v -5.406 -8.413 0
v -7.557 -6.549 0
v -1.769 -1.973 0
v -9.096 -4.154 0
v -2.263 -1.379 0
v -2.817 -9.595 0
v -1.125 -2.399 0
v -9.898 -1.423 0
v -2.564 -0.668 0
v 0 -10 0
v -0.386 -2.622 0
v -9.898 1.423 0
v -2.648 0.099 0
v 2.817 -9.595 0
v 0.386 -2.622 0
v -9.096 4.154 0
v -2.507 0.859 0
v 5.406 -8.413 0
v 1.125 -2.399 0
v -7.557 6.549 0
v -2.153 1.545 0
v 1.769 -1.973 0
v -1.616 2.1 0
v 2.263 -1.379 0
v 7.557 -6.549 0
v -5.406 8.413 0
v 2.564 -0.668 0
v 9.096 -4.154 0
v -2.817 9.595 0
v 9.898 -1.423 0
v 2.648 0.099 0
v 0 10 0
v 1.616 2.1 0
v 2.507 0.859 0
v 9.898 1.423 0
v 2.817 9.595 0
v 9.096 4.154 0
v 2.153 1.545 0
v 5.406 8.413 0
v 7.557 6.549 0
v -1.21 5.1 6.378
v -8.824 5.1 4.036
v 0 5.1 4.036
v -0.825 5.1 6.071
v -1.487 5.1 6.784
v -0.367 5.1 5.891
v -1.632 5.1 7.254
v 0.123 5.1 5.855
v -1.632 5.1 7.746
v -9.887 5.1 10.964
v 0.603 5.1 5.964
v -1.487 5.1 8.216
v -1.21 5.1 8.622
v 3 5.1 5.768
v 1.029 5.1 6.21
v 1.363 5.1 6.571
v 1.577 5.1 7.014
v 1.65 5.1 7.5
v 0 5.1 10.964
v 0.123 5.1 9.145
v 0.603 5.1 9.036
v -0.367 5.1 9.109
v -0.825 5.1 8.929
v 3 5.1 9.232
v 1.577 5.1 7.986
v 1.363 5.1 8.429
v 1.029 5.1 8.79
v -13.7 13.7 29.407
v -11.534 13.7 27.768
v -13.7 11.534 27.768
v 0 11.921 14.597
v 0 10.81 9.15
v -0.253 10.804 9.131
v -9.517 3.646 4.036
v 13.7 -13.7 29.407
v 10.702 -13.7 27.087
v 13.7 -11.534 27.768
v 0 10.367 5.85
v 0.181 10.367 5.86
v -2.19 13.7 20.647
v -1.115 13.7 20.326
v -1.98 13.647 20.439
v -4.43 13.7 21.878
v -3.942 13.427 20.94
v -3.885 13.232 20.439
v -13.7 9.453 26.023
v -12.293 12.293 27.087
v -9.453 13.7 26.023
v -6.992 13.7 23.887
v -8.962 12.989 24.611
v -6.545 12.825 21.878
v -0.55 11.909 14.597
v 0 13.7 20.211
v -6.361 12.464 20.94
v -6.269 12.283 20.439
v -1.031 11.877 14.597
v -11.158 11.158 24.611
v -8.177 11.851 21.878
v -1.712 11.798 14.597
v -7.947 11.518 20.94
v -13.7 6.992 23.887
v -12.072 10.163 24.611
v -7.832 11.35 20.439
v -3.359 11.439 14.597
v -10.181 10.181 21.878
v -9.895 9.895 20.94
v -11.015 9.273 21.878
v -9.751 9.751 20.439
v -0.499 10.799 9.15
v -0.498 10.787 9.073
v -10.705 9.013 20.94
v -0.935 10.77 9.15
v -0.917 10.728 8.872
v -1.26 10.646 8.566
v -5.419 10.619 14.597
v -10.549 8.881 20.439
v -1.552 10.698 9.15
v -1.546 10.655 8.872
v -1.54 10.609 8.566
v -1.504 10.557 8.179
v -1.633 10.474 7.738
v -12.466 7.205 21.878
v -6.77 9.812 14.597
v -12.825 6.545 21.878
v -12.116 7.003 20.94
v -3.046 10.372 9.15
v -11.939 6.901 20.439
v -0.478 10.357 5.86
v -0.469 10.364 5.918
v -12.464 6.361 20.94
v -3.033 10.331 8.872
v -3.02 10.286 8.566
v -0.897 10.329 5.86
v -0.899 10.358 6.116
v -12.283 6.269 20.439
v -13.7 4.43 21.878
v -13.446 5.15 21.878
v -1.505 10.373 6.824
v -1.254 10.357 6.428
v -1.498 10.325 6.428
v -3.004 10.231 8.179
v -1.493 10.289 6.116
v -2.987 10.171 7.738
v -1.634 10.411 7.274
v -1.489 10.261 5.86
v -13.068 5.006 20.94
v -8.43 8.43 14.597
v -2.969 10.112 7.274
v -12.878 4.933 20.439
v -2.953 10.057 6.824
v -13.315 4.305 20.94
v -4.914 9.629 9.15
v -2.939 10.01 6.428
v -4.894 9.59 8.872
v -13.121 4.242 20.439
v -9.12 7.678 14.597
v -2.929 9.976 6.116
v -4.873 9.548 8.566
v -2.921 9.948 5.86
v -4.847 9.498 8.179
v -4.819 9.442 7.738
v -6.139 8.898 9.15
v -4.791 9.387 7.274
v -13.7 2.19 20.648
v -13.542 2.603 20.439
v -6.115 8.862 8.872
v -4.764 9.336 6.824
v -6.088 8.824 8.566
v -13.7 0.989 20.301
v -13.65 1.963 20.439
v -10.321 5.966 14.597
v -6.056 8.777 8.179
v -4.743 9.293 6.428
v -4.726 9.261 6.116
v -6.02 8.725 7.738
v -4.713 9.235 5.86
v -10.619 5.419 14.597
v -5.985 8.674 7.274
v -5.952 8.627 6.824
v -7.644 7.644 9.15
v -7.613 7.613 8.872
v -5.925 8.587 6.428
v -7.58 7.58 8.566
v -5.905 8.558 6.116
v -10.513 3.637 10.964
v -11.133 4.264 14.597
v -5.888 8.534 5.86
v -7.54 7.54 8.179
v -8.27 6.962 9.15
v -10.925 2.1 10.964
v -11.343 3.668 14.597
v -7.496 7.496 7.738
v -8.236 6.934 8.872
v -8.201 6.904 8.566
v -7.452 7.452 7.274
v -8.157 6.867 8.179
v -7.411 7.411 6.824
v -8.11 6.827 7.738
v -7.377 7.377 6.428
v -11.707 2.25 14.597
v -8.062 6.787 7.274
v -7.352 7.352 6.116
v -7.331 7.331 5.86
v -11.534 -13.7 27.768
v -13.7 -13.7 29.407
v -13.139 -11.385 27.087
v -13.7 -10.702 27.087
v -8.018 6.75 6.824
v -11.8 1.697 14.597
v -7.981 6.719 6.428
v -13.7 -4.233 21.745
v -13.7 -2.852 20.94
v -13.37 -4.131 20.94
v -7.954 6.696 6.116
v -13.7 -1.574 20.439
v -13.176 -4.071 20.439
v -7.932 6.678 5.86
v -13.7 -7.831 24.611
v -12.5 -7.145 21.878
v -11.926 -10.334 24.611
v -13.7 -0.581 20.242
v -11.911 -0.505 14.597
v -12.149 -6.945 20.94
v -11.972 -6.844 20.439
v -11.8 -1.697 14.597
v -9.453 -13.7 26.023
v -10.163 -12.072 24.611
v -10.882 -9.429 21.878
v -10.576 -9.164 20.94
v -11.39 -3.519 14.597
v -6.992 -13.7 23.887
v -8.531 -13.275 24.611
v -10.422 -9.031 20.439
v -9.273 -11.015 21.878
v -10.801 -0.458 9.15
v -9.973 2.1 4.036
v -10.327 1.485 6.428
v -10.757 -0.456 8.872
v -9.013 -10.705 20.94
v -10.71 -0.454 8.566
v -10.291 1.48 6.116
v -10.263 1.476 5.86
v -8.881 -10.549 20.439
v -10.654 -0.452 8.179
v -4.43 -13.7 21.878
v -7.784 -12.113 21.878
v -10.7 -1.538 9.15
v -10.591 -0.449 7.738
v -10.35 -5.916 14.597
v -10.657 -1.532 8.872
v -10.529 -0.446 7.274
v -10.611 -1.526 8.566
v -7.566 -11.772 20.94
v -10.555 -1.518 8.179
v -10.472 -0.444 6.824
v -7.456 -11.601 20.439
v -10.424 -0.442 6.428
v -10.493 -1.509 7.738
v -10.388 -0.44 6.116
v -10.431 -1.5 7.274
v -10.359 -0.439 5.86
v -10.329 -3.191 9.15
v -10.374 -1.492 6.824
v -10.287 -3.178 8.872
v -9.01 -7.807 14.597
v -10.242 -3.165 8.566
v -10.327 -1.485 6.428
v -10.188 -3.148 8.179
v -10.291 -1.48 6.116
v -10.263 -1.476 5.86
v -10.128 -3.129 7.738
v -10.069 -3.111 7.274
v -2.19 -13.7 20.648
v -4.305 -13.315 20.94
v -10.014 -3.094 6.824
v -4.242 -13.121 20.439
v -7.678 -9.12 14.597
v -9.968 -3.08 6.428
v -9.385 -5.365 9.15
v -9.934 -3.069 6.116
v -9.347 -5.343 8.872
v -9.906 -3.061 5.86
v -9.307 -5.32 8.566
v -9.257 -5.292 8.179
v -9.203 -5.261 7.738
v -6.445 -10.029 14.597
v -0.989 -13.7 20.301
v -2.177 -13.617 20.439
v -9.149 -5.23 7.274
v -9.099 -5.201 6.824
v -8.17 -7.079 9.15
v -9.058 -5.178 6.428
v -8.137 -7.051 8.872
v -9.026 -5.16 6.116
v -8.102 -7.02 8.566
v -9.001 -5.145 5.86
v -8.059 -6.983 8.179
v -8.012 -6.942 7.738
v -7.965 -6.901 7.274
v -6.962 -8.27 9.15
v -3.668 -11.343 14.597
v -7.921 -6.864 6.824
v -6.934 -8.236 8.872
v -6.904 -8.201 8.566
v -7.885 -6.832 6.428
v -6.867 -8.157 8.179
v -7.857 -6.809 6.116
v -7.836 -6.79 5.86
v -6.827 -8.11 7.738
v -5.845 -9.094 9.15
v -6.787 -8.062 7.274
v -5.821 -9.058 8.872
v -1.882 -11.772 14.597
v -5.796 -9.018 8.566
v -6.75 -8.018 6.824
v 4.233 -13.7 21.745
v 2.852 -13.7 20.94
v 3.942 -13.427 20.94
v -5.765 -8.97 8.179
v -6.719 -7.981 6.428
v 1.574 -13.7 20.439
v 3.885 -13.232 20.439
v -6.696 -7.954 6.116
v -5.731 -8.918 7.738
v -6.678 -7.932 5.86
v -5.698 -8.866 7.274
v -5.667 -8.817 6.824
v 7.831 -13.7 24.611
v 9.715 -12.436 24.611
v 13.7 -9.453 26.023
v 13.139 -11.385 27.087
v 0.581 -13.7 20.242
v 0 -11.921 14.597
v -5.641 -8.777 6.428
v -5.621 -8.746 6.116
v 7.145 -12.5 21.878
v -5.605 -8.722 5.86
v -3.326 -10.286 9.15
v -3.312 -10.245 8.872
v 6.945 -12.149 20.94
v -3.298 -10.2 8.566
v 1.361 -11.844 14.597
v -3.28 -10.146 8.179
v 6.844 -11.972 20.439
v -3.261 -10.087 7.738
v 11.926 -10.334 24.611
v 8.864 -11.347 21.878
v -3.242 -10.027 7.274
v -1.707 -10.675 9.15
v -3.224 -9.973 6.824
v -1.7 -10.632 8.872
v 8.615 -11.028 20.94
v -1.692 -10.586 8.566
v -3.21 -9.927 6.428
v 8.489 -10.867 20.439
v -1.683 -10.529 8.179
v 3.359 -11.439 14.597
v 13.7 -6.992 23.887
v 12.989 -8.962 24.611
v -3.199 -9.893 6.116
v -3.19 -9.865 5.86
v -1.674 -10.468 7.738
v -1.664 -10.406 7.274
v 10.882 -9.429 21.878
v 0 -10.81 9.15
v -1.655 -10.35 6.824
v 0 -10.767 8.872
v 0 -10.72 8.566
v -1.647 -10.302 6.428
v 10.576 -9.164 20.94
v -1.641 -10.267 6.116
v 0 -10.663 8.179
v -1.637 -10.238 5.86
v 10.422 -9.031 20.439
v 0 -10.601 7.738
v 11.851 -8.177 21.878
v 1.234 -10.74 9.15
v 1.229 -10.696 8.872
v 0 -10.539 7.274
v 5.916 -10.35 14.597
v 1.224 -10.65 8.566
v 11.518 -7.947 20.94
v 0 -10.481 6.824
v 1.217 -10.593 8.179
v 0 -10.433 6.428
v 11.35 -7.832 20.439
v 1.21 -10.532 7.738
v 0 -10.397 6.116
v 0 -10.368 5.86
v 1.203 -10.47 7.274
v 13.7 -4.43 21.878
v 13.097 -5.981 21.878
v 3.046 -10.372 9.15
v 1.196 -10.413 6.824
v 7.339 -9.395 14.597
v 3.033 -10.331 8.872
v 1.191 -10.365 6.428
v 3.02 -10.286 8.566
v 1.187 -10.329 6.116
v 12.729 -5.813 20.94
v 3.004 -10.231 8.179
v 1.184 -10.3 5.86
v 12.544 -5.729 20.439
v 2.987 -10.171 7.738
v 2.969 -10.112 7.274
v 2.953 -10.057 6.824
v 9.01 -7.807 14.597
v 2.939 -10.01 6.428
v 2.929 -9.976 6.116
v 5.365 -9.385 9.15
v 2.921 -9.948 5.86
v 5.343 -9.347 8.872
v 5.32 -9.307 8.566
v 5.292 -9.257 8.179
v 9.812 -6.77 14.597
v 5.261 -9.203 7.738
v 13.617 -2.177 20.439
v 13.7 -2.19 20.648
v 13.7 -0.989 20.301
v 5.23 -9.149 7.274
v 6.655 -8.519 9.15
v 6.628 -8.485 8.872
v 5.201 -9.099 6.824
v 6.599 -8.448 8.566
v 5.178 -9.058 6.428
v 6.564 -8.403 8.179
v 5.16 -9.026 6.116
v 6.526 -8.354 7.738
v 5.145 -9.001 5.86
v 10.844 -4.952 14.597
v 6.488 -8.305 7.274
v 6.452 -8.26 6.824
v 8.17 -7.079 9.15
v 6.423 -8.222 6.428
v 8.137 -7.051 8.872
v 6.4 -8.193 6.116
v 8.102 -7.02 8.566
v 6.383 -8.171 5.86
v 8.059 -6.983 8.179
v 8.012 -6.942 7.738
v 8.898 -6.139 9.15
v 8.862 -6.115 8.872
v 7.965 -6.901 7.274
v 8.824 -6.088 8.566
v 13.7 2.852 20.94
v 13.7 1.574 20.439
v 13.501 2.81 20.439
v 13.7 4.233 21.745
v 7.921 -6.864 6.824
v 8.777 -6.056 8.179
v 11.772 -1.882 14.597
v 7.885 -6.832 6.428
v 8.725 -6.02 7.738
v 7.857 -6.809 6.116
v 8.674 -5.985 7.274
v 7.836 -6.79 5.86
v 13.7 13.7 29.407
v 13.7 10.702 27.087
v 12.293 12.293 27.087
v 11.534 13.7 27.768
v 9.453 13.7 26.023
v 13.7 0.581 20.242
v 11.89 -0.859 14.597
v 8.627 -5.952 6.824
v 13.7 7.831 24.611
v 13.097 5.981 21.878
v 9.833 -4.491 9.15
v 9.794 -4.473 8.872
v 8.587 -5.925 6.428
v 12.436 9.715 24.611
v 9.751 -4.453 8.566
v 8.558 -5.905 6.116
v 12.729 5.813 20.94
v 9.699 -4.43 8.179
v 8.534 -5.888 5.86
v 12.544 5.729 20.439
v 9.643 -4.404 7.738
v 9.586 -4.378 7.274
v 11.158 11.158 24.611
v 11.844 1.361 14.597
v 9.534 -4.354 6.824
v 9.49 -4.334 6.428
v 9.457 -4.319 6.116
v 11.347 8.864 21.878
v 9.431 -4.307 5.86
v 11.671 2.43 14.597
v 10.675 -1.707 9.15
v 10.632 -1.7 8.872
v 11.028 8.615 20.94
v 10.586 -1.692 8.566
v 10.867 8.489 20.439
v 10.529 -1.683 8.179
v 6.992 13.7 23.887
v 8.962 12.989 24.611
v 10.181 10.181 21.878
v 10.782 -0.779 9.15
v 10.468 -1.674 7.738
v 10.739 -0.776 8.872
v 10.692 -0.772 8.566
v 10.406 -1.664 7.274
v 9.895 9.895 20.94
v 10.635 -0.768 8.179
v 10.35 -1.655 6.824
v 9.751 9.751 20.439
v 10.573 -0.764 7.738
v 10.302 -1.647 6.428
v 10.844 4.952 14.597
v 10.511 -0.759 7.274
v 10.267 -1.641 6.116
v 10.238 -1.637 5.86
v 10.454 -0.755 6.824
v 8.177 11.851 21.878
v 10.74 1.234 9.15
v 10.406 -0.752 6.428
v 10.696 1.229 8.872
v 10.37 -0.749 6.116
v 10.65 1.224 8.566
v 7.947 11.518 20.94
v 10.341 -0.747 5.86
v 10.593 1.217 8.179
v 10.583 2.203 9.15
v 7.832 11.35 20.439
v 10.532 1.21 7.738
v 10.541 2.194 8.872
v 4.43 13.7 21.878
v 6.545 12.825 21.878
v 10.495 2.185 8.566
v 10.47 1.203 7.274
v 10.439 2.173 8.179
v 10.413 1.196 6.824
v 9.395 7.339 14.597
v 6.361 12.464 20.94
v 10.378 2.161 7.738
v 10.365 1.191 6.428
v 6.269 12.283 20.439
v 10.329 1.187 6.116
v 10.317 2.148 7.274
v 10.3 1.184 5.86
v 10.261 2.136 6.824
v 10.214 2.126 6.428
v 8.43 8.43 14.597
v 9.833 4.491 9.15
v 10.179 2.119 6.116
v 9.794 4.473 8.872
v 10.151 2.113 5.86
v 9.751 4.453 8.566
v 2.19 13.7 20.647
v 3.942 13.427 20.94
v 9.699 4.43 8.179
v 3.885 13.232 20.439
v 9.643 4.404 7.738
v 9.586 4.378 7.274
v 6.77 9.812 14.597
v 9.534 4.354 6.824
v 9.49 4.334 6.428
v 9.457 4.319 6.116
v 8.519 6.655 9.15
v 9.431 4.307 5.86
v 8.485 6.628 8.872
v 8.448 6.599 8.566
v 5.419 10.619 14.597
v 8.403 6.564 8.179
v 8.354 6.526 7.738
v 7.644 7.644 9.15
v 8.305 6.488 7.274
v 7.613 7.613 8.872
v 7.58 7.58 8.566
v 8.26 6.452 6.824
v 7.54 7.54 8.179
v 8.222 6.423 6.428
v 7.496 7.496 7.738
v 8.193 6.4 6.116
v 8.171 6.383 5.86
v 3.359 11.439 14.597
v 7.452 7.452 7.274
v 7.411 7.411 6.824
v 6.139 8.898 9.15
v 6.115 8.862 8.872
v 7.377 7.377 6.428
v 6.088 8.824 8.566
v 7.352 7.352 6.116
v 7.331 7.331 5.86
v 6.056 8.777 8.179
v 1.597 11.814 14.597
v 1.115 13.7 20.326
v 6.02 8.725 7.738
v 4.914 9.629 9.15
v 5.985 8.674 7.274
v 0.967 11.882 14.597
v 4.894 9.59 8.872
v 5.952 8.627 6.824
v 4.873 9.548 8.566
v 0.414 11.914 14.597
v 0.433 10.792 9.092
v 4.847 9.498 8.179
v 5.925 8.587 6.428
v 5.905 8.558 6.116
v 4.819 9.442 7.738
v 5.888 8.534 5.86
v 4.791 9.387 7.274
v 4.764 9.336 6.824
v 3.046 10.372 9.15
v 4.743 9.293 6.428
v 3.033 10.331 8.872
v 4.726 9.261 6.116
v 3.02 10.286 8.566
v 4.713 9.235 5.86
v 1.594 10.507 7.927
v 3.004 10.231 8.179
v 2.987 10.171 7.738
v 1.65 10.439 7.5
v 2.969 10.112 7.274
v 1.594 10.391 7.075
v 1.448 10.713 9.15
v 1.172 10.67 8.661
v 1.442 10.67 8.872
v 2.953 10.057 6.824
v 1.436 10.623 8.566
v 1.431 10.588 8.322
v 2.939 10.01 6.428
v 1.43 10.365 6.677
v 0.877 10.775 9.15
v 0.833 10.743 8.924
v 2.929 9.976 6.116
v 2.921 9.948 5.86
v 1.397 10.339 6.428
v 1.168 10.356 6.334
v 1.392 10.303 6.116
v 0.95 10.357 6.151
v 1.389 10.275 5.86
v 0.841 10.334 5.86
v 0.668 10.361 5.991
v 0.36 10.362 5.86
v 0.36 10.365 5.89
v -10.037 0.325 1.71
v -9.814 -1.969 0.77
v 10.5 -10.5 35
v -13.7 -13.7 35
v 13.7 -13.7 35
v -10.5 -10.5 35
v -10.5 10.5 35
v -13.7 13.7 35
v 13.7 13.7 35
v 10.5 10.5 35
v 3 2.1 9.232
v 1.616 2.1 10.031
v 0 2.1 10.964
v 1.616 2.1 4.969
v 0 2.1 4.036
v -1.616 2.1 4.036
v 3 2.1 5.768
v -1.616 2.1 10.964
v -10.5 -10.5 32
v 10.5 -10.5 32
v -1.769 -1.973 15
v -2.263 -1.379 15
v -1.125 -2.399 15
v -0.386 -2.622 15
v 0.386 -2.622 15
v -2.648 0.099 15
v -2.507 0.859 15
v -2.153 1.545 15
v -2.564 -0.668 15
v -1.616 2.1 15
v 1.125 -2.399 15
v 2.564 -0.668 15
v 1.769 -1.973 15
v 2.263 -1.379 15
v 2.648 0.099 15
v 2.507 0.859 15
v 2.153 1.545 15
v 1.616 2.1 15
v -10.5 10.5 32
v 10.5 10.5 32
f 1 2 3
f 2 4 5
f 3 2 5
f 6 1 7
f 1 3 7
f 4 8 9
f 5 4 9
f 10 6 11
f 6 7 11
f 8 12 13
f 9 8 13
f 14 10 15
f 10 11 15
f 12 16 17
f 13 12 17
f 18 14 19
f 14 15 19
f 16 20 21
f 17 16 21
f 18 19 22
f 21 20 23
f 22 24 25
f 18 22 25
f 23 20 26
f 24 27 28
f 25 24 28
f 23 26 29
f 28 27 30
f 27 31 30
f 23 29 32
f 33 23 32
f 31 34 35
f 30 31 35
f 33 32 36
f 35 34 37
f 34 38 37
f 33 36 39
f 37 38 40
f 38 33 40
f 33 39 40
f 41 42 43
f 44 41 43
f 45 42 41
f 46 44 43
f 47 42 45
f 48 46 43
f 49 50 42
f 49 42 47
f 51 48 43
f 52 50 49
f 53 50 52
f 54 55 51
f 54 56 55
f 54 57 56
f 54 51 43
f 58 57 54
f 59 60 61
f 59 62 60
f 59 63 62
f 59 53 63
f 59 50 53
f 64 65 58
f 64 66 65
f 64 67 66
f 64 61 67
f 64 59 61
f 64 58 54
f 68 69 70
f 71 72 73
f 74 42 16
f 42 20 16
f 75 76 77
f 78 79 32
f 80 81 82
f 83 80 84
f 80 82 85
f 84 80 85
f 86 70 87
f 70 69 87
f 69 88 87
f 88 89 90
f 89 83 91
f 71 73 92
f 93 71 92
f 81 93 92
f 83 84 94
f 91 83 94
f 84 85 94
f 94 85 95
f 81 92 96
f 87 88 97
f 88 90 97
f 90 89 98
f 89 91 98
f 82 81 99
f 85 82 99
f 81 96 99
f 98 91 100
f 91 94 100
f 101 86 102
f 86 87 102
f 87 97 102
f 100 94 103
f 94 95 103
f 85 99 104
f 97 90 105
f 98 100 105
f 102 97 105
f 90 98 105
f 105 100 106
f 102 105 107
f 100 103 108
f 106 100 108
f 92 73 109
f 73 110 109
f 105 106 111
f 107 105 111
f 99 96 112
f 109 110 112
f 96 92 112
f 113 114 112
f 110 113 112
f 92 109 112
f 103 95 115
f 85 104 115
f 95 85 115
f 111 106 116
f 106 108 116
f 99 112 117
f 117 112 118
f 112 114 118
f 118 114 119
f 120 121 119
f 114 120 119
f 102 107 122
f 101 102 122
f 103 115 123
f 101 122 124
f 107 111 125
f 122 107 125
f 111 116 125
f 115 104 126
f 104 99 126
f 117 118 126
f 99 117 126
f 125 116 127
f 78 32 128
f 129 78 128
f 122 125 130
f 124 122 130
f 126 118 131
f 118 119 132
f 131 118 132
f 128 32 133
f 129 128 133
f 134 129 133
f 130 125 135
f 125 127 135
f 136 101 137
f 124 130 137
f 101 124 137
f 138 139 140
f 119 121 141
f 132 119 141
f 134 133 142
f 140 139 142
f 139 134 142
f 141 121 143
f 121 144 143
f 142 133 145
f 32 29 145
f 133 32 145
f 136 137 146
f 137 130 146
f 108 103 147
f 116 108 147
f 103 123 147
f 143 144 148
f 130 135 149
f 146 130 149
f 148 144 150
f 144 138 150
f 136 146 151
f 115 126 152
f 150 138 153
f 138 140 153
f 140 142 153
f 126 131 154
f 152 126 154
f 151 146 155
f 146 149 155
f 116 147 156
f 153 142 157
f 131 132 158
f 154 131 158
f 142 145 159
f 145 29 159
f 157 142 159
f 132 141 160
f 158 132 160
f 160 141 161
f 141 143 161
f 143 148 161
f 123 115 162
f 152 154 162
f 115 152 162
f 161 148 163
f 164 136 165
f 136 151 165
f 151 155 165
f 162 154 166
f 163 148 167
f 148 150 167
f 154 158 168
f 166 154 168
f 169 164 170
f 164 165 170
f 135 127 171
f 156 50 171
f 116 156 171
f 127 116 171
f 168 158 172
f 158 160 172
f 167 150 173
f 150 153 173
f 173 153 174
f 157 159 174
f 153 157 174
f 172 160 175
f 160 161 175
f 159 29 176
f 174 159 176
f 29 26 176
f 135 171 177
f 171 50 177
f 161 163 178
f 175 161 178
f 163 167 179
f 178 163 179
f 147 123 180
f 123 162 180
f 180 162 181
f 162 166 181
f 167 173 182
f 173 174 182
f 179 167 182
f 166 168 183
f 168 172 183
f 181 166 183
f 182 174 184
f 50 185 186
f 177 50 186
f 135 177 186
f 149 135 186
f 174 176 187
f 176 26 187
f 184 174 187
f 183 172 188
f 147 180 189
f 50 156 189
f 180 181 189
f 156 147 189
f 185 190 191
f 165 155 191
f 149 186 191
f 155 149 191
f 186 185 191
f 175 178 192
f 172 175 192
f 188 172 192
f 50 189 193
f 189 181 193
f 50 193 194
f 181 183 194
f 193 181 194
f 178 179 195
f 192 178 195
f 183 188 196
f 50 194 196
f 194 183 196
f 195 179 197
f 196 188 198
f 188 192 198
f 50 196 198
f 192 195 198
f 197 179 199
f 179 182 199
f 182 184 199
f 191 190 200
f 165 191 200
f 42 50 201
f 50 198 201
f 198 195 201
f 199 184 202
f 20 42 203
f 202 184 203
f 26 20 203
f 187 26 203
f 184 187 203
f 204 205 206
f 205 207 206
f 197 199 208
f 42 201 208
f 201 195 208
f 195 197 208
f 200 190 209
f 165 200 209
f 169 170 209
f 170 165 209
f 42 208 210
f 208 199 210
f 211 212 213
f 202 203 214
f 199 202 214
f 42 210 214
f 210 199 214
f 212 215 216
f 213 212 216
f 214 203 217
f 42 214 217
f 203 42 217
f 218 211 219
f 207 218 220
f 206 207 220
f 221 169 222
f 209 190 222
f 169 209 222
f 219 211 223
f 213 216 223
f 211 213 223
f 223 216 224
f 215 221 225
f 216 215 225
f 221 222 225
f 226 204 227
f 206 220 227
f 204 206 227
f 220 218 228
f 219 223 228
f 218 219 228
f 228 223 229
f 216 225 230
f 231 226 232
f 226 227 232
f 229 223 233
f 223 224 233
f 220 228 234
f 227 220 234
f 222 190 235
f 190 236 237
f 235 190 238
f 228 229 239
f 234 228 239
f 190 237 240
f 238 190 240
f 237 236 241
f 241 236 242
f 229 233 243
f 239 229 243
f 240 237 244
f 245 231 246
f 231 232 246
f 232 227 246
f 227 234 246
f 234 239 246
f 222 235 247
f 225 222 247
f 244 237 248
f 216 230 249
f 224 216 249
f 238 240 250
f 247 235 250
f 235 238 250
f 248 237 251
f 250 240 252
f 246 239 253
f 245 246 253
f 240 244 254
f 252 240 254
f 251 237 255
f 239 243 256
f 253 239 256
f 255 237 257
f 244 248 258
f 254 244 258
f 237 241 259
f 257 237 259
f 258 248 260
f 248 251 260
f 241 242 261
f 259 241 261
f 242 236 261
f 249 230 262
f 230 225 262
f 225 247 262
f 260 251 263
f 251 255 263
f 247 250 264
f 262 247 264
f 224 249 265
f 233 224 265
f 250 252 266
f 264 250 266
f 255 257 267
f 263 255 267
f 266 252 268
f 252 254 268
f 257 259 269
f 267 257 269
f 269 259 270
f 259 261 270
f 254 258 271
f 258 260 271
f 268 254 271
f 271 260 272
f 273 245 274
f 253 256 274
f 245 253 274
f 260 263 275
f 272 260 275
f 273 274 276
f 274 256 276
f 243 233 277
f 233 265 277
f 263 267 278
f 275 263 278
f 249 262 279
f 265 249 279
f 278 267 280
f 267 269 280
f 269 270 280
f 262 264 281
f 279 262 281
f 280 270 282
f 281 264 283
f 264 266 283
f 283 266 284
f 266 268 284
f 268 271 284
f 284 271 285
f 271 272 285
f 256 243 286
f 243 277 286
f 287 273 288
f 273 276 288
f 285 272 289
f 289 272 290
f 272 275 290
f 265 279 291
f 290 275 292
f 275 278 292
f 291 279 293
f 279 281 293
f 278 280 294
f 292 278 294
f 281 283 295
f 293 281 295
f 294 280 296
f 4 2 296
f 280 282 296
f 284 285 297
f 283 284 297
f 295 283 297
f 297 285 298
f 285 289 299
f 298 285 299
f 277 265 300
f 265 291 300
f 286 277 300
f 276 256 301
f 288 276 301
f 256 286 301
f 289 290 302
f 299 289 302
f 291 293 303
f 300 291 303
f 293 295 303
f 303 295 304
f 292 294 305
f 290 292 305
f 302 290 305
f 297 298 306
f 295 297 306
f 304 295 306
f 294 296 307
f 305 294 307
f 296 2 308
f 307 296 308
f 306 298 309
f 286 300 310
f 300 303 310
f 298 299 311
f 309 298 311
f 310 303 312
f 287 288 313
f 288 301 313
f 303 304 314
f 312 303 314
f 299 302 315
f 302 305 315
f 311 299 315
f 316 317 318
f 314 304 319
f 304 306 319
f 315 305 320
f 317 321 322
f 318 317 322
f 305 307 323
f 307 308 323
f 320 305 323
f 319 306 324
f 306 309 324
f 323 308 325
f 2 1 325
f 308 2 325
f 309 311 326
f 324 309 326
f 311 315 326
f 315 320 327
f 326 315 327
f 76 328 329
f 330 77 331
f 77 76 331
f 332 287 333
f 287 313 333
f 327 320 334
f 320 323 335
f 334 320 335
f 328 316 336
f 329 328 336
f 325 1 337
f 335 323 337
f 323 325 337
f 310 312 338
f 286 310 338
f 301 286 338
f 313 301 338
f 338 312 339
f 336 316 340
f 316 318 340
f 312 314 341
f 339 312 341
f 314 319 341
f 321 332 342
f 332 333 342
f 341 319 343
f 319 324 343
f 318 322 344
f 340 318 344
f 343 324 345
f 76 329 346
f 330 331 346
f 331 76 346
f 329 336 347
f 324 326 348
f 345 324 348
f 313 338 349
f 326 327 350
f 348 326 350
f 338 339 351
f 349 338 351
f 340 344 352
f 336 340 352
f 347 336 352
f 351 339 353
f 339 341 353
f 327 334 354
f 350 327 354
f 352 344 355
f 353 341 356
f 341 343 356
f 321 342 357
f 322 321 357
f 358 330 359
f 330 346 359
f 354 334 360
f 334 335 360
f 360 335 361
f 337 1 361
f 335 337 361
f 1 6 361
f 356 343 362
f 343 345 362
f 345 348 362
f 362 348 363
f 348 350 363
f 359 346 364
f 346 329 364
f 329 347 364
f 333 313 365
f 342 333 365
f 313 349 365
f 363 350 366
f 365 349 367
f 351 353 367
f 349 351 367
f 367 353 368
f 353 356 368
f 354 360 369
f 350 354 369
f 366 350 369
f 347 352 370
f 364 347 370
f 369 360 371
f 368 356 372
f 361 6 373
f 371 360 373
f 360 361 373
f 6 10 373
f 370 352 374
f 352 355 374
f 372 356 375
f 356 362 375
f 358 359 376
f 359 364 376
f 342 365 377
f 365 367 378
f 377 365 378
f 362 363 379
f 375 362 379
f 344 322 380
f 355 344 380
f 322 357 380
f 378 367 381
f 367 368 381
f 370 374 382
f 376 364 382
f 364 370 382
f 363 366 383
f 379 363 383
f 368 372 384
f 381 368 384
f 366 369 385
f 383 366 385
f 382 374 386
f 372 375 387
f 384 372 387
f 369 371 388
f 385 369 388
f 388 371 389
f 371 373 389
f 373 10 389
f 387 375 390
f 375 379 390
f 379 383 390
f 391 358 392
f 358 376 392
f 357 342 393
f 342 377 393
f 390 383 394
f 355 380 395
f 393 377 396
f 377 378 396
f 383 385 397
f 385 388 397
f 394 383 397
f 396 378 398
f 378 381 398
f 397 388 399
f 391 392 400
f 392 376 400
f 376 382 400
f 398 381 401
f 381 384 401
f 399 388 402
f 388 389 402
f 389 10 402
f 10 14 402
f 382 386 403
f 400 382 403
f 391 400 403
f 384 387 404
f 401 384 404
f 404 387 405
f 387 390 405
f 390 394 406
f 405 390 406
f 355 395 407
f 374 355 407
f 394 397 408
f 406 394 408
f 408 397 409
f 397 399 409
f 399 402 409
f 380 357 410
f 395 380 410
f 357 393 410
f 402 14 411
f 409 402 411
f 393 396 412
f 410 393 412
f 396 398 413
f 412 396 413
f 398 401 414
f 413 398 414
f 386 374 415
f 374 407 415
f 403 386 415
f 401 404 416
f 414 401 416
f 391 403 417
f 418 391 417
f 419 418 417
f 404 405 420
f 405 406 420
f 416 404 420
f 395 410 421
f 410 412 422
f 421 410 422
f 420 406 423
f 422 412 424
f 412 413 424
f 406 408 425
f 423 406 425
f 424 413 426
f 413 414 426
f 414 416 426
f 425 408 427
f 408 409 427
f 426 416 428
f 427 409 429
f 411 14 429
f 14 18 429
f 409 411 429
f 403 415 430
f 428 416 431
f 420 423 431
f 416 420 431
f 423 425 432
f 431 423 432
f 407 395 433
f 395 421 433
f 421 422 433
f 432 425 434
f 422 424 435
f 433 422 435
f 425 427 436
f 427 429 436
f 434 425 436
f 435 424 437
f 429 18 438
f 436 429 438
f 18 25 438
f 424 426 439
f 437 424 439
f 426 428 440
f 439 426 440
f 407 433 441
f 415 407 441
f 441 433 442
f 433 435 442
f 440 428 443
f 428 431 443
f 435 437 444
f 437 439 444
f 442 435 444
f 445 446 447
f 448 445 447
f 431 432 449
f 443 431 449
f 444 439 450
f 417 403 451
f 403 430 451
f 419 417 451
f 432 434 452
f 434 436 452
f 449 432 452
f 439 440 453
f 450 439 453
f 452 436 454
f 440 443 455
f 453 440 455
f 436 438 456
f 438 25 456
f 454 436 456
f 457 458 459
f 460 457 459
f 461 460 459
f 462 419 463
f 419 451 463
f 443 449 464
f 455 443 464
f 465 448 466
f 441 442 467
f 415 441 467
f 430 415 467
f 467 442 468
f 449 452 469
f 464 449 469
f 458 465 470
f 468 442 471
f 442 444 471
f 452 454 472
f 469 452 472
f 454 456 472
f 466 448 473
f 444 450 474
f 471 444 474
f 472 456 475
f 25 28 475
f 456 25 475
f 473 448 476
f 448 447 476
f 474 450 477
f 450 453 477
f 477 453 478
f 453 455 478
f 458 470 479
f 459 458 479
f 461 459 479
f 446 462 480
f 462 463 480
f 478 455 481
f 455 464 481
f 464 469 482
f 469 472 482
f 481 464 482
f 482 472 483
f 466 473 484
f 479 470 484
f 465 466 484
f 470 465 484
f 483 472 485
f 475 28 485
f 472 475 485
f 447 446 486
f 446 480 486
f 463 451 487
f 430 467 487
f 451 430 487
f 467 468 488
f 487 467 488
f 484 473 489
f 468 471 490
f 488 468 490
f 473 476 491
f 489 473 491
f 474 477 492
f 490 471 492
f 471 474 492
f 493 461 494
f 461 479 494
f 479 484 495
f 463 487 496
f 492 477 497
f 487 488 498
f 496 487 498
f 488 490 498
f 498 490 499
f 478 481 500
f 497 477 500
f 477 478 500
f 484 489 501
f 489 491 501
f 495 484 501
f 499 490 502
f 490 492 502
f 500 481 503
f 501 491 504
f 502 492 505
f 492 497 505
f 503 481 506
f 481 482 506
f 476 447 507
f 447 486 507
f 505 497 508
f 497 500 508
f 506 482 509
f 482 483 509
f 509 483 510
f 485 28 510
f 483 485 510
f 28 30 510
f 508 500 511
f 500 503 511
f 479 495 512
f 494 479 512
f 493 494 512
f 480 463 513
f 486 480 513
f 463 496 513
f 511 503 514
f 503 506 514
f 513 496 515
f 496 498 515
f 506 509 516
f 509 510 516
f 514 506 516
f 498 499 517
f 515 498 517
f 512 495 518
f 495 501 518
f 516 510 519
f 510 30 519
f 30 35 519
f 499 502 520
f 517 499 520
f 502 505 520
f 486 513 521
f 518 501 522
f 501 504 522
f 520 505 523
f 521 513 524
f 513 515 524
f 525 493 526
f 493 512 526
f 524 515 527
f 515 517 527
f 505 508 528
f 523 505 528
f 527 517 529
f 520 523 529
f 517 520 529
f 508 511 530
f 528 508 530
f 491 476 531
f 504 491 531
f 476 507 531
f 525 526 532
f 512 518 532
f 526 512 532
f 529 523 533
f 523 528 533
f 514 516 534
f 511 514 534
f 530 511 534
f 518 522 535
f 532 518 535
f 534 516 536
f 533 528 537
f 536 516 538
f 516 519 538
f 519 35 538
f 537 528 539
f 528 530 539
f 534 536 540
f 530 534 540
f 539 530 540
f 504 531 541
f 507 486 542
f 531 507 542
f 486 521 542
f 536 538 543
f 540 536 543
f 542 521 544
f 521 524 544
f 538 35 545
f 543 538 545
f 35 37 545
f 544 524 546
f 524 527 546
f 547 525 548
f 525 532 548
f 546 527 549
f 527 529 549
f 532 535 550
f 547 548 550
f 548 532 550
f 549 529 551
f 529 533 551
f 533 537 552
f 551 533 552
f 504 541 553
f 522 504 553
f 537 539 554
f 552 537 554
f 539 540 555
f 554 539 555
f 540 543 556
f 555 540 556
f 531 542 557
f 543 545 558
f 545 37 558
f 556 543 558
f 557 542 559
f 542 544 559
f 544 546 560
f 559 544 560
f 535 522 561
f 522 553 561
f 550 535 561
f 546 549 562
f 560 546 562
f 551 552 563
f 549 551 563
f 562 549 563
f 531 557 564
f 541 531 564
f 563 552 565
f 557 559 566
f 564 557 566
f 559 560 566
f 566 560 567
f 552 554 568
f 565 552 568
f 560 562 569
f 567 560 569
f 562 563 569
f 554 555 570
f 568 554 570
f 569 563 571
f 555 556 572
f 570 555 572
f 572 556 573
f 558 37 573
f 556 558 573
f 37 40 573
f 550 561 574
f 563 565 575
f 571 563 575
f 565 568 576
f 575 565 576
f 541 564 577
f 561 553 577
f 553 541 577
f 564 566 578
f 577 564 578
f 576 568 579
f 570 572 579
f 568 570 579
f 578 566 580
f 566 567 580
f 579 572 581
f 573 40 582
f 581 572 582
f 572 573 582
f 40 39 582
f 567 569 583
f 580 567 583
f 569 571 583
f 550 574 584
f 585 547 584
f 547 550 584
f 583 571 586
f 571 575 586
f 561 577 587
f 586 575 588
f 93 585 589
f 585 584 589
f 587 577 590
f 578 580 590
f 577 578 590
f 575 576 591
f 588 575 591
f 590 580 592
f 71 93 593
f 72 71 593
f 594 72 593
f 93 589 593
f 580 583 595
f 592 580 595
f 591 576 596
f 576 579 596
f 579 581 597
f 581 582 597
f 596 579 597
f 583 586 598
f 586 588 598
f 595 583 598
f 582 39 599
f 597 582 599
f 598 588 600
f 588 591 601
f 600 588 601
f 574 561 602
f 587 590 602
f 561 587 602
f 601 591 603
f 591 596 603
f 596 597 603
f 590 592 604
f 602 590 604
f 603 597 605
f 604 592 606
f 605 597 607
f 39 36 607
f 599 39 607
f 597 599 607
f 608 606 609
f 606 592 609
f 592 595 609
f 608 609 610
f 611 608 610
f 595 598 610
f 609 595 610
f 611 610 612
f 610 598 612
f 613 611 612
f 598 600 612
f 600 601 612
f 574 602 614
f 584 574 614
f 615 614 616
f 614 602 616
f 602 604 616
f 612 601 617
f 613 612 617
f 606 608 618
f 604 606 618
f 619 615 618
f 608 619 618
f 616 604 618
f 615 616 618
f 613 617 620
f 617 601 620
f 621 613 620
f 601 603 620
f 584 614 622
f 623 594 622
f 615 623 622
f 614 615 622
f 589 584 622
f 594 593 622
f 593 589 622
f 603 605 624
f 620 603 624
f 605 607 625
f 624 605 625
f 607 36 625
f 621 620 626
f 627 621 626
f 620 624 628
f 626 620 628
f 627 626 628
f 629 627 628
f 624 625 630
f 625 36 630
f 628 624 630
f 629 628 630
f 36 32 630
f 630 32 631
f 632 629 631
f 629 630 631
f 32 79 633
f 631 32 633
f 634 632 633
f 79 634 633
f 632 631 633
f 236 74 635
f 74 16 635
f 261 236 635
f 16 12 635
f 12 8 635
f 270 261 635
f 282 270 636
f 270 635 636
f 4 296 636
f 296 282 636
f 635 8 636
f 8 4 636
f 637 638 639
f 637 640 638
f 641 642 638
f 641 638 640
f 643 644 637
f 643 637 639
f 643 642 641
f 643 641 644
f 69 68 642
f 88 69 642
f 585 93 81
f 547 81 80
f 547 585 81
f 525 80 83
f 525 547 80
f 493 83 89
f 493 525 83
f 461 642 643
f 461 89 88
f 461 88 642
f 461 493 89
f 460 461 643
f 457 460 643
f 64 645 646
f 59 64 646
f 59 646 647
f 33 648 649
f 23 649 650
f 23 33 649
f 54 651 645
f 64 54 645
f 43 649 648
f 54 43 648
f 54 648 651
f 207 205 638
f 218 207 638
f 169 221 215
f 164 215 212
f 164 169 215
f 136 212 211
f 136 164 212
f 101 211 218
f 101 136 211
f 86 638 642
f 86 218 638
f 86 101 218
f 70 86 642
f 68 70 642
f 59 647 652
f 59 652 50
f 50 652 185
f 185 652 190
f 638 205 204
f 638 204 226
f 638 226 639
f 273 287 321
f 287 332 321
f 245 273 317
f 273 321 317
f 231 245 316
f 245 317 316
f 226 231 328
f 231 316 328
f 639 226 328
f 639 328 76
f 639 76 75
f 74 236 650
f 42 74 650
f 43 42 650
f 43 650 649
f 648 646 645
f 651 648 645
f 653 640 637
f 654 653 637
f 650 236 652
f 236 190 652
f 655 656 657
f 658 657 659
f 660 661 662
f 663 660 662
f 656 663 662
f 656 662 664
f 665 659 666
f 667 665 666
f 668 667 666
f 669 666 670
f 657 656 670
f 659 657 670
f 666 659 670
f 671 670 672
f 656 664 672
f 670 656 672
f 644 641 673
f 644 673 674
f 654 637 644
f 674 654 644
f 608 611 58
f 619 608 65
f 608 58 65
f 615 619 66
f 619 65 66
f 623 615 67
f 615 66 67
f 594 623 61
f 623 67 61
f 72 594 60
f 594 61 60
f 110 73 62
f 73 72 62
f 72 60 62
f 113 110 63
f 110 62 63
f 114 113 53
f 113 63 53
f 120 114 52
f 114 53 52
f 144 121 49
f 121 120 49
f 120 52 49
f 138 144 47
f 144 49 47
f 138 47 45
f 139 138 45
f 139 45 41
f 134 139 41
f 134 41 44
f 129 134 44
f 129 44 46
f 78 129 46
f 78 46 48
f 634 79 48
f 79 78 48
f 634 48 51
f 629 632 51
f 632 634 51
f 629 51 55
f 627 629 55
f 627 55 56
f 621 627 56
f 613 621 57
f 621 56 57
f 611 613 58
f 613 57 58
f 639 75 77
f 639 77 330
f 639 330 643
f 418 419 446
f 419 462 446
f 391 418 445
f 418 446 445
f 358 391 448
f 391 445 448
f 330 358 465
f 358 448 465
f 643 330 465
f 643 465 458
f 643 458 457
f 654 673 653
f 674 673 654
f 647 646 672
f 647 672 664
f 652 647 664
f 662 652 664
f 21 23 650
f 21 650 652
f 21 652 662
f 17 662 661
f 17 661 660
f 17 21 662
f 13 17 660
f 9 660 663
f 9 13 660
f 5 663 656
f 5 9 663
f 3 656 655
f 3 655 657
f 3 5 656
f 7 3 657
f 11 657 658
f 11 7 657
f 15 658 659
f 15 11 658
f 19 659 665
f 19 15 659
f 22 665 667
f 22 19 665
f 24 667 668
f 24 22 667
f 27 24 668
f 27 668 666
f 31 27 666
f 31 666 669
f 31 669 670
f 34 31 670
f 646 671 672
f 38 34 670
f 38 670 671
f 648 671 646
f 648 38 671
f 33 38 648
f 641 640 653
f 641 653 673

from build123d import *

# Parameters (mm, degrees)
SKETCH1_R           = 10
BOSS_EXTRUDE1_DEPTH = 30
SKETCH2_W           = 27.4
SKETCH2_H           = 27.4
BOSS_EXTRUDE2_DEPTH = 5
SKETCH3_W           = 21
SKETCH3_H           = 21
CUT_EXTRUDE1_DEPTH  = 3
SKETCH7_W           = 47.139349652
SKETCH7_H           = 47.139349652
SKETCH7_W_2         = 27.4
SKETCH7_H_2         = 27.4
CUT_EXTRUDE2_DEPTH  = 78
CUT_EXTRUDE3_DEPTH  = 15
CUT_EXTRUDE4_DEPTH  = 3
SKETCH11_R          = 1.65
CUT_EXTRUDE5_DEPTH  = 12


with BuildPart() as part:
    # Sketch1 → Boss-Extrude1 (new body)
    with BuildSketch(Plane.XY):
        Circle(SKETCH1_R)
    extrude(amount=BOSS_EXTRUDE1_DEPTH)

    # Sketch2 → Boss-Extrude2 (add)
    with BuildSketch(Plane.XY.offset(30)):
        Rectangle(SKETCH2_W, SKETCH2_H)
    extrude(amount=BOSS_EXTRUDE2_DEPTH)

    # Sketch3 → Cut-Extrude1 (cut)
    with BuildSketch(Plane.XY.offset(35)):
        Rectangle(SKETCH3_W, SKETCH3_H)
    extrude(amount=-CUT_EXTRUDE1_DEPTH, mode=Mode.SUBTRACT)

    # Sketch6 → Revolve1 (revolve)
    with BuildSketch(Plane(origin=(0, 0, 0), x_dir=(0, 0, -1), z_dir=(1, 0, 0))):
        with BuildLine():
            Line((-30, 0), (-30, 20))
            add(Edge.make_bspline(
                [(-30, 20), (-22.099947356, 11.248565128), (-4.613209845, 10), (0, 10)],
                knots=[0, 0, 0, 0, 1, 1, 1, 1], degree=3))
            Line((0, 10), (0, 0))
            Line((0, 0), (-30, 0))
        make_face()
    revolve(axis=Axis((0, 0, 63.541170981), (0, 0, 1)))

    # Sketch7 → Cut-Extrude2 (cut)
    with BuildSketch(Plane.XY.offset(30)):
        Rectangle(SKETCH7_W, SKETCH7_H)
        Rectangle(SKETCH7_W_2, SKETCH7_H_2, mode=Mode.SUBTRACT)
    extrude(amount=-CUT_EXTRUDE2_DEPTH, mode=Mode.SUBTRACT)

    # Sketch8 → Cut-Extrude3 (cut)
    with BuildSketch(Plane(origin=(0, 0, 0), x_dir=(-1, 0, 0), z_dir=(0, 0, -1))):
        with BuildLine():
            Line((-1.616322988, 2.1), (1.616322988, 2.1))
            ThreePointArc((1.616322988, 2.1), (0, -2.65), (-1.616322988, 2.1))
        make_face()
    extrude(amount=-CUT_EXTRUDE3_DEPTH, mode=Mode.SUBTRACT)

    # Sketch10 → Cut-Extrude4 (cut)
    with BuildSketch(Plane.XZ.offset(-2.1)):
        Polygon((0, 4.035898385), (3, 5.767949192), (3, 9.232050808), (0, 10.964101615), (-15.10195651, 10.964101615), (-15.10195651, 4.035898385), align=None)
    extrude(amount=-CUT_EXTRUDE4_DEPTH, mode=Mode.SUBTRACT)

    # Sketch11 → Cut-Extrude5 (cut)
    with BuildSketch(Plane.XZ.offset(-5.1)):
        with Locations((0, 7.5)):
            Circle(SKETCH11_R)
    extrude(amount=-CUT_EXTRUDE5_DEPTH, mode=Mode.SUBTRACT)


solid = part.part
